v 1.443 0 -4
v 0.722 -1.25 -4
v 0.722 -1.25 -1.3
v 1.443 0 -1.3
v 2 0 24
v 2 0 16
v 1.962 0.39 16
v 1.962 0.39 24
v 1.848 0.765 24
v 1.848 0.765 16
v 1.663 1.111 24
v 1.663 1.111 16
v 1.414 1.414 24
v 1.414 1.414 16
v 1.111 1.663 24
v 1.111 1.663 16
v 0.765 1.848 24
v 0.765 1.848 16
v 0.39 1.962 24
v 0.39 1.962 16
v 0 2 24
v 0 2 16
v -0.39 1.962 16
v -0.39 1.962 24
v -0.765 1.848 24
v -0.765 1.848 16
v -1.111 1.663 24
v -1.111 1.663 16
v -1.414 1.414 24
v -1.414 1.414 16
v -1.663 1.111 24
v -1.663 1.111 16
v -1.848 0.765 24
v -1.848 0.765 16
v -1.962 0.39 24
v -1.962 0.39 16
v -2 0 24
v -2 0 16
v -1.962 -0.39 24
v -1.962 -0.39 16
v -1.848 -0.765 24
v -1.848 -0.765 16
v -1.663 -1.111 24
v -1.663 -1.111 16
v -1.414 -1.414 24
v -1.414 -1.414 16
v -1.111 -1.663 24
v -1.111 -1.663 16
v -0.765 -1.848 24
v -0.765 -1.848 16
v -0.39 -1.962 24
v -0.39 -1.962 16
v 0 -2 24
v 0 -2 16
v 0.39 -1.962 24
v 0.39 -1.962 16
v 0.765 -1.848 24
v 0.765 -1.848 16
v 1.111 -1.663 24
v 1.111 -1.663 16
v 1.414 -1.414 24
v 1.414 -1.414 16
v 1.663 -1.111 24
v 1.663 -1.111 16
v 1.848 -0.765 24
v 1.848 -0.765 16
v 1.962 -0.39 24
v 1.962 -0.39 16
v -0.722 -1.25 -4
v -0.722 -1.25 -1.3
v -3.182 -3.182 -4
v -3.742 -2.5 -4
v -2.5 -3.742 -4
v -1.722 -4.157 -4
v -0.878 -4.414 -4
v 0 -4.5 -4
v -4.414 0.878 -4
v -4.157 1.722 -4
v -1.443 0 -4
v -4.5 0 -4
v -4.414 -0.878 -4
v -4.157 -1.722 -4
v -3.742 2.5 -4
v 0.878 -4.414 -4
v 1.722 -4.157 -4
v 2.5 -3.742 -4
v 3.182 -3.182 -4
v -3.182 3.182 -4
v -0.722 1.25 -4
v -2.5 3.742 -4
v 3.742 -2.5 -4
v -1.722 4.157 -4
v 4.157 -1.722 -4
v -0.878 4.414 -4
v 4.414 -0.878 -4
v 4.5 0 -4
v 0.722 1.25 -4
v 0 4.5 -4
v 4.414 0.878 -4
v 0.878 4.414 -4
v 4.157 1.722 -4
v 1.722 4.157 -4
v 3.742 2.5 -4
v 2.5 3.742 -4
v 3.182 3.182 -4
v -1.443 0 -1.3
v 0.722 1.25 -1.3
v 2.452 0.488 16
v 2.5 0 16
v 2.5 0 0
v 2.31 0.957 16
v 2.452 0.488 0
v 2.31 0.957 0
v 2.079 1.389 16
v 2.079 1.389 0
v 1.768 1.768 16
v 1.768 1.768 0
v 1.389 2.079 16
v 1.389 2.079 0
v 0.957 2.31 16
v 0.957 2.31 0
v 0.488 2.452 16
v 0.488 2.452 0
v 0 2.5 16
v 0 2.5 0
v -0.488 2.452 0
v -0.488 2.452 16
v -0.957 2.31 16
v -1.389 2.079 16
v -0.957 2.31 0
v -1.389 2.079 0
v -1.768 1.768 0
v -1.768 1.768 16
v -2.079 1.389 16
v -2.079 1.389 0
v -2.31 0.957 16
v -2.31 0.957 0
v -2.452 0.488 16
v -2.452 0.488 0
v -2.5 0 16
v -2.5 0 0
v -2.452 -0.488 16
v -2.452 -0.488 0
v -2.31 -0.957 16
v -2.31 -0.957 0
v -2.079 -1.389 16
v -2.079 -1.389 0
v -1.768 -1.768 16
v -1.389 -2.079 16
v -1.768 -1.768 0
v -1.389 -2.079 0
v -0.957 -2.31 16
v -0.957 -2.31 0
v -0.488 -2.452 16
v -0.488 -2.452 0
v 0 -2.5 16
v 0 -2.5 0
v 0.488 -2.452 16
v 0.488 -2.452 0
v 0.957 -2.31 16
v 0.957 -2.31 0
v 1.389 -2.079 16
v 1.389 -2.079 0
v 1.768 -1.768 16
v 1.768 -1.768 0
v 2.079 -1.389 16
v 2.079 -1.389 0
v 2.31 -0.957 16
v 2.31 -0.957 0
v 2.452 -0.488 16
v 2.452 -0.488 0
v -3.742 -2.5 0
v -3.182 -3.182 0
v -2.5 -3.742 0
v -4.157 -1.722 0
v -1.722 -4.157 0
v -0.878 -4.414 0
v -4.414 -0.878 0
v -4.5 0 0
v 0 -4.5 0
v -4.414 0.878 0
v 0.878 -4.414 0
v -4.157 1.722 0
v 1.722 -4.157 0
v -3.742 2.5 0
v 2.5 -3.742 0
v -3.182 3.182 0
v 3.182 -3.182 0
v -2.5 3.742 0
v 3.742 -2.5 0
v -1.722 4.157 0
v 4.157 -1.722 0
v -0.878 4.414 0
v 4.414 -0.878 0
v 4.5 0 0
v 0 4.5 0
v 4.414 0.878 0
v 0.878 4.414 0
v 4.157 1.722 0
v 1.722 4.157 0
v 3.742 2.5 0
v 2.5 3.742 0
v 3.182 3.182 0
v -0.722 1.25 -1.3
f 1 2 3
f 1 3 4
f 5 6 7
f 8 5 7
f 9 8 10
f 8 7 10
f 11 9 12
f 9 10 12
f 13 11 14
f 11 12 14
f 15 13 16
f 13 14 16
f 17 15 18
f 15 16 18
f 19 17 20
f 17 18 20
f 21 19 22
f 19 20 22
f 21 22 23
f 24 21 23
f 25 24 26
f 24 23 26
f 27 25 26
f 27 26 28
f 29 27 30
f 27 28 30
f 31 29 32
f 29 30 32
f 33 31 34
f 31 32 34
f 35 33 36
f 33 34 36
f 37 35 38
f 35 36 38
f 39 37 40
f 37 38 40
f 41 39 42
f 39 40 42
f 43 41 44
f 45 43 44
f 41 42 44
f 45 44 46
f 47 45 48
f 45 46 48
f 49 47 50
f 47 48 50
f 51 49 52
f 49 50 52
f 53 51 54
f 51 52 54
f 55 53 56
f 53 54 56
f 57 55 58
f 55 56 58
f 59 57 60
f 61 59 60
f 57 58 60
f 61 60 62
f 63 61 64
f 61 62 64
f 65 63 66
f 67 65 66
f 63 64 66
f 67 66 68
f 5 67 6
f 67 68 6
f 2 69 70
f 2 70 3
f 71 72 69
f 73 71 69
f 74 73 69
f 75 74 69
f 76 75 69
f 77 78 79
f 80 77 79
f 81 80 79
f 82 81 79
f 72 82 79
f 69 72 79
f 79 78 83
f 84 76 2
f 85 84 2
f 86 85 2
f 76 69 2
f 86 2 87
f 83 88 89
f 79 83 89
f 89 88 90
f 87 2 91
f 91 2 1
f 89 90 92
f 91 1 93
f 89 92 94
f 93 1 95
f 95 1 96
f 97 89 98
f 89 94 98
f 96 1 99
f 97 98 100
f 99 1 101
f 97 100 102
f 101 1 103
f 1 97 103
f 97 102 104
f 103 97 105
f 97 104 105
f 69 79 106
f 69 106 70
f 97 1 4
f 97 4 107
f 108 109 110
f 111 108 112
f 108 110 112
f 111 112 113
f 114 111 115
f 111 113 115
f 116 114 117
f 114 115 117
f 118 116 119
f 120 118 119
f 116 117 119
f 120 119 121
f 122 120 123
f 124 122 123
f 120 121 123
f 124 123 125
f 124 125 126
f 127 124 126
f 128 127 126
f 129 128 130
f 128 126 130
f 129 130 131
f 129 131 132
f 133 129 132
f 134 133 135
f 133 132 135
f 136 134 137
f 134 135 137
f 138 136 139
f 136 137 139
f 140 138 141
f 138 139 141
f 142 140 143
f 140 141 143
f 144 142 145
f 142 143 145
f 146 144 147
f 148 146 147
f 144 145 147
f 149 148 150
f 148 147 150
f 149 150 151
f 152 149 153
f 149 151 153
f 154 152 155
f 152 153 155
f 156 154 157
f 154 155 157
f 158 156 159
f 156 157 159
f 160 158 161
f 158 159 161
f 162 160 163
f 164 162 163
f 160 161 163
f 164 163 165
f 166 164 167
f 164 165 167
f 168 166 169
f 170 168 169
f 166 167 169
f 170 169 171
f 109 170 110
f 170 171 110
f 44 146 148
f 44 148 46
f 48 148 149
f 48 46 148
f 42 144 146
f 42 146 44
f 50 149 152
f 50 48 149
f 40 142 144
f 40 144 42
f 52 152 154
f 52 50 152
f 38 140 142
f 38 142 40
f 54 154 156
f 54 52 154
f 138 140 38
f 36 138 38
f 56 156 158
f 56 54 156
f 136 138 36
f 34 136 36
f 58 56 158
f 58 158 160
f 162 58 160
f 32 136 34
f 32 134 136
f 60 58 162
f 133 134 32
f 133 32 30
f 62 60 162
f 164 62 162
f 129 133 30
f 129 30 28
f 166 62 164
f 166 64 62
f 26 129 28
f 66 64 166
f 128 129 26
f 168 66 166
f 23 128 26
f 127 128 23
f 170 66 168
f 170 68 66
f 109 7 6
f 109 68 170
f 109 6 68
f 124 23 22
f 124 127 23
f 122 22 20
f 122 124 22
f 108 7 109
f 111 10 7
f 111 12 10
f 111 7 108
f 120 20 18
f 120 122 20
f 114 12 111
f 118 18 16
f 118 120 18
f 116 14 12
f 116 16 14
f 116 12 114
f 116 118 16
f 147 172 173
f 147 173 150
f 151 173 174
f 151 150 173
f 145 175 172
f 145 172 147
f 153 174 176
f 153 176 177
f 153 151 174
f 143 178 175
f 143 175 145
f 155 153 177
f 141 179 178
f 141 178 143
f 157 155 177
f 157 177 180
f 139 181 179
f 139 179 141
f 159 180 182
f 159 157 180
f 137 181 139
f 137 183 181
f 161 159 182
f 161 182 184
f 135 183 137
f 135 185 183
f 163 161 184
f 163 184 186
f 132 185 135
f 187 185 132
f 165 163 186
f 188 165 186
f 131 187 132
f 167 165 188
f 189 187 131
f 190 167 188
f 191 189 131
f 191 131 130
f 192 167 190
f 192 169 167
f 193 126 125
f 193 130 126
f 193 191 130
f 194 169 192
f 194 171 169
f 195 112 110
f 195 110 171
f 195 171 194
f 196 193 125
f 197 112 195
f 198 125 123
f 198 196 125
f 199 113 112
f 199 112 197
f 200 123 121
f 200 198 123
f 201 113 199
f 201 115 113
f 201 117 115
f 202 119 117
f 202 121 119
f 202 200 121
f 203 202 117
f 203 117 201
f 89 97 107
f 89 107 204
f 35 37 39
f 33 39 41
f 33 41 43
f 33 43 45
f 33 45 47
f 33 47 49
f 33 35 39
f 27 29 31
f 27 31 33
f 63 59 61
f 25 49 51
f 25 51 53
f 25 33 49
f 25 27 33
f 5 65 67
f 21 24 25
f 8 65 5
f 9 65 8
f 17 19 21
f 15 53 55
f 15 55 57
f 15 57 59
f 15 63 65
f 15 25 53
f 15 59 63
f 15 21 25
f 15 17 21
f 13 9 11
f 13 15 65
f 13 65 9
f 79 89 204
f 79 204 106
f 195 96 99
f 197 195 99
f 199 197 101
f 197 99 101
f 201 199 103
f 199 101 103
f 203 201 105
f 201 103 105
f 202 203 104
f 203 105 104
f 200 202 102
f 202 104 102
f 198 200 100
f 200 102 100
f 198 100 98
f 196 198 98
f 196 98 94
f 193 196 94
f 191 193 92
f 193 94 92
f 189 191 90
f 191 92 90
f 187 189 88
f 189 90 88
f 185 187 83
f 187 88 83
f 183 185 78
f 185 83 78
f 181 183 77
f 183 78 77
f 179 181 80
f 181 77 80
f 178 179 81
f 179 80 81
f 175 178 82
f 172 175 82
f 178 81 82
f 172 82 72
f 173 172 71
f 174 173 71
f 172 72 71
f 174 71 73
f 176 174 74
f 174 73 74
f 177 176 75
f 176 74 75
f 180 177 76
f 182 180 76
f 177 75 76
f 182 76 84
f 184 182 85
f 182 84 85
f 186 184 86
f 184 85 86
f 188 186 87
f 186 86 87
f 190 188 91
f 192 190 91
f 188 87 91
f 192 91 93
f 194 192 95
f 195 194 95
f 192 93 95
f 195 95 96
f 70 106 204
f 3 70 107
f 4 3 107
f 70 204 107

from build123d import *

# Parameters (mm, degrees)
S01_GROUND_BEARING_SHOULDER_R      = 2.5
F_01_GROUND_BEARING_SHOULDER_DEPTH = 16
F_02_START                         = 16
S02_M4_RETAINING_THREAD_R          = 2
F_02_M4_RETAINING_THREAD_DEPTH     = 8
F_03_START                         = -4
S03_SOCKET_HEAD_R                  = 4.5
F_03_SOCKET_HEAD_DEPTH             = 4
F_04_START                         = -4.1
F_04_2_5_MM_HEX_KEY_DEPTH          = 2.8


with BuildPart() as part:
    # S01 - Ground bearing shoulder → 01 - Ground bearing shoulder (new body)
    with BuildSketch(Plane.XY):
        Circle(S01_GROUND_BEARING_SHOULDER_R)
    extrude(amount=F_01_GROUND_BEARING_SHOULDER_DEPTH)

    # S02 - M4 retaining thread → 02 - M4 retaining thread (add)
    with BuildSketch(Plane.XY.offset(F_02_START)):
        Circle(S02_M4_RETAINING_THREAD_R)
    extrude(amount=F_02_M4_RETAINING_THREAD_DEPTH)

    # S03 - Socket head → 03 - Socket head (add)
    with BuildSketch(Plane.XY.offset(F_03_START)):
        Circle(S03_SOCKET_HEAD_R)
    extrude(amount=F_03_SOCKET_HEAD_DEPTH)

    # S04 - 2.5 mm hex key → 04 - 2.5 mm hex key (cut)
    with BuildSketch(Plane.XY.offset(F_04_START)):
        Polygon((1.443375673, 0), (0.721687836, 1.25), (-0.721687836, 1.25), (-1.443375673, 0), (-0.721687836, -1.25), (0.721687836, -1.25), align=None)
    extrude(amount=F_04_2_5_MM_HEX_KEY_DEPTH, mode=Mode.SUBTRACT)


solid = part.part
